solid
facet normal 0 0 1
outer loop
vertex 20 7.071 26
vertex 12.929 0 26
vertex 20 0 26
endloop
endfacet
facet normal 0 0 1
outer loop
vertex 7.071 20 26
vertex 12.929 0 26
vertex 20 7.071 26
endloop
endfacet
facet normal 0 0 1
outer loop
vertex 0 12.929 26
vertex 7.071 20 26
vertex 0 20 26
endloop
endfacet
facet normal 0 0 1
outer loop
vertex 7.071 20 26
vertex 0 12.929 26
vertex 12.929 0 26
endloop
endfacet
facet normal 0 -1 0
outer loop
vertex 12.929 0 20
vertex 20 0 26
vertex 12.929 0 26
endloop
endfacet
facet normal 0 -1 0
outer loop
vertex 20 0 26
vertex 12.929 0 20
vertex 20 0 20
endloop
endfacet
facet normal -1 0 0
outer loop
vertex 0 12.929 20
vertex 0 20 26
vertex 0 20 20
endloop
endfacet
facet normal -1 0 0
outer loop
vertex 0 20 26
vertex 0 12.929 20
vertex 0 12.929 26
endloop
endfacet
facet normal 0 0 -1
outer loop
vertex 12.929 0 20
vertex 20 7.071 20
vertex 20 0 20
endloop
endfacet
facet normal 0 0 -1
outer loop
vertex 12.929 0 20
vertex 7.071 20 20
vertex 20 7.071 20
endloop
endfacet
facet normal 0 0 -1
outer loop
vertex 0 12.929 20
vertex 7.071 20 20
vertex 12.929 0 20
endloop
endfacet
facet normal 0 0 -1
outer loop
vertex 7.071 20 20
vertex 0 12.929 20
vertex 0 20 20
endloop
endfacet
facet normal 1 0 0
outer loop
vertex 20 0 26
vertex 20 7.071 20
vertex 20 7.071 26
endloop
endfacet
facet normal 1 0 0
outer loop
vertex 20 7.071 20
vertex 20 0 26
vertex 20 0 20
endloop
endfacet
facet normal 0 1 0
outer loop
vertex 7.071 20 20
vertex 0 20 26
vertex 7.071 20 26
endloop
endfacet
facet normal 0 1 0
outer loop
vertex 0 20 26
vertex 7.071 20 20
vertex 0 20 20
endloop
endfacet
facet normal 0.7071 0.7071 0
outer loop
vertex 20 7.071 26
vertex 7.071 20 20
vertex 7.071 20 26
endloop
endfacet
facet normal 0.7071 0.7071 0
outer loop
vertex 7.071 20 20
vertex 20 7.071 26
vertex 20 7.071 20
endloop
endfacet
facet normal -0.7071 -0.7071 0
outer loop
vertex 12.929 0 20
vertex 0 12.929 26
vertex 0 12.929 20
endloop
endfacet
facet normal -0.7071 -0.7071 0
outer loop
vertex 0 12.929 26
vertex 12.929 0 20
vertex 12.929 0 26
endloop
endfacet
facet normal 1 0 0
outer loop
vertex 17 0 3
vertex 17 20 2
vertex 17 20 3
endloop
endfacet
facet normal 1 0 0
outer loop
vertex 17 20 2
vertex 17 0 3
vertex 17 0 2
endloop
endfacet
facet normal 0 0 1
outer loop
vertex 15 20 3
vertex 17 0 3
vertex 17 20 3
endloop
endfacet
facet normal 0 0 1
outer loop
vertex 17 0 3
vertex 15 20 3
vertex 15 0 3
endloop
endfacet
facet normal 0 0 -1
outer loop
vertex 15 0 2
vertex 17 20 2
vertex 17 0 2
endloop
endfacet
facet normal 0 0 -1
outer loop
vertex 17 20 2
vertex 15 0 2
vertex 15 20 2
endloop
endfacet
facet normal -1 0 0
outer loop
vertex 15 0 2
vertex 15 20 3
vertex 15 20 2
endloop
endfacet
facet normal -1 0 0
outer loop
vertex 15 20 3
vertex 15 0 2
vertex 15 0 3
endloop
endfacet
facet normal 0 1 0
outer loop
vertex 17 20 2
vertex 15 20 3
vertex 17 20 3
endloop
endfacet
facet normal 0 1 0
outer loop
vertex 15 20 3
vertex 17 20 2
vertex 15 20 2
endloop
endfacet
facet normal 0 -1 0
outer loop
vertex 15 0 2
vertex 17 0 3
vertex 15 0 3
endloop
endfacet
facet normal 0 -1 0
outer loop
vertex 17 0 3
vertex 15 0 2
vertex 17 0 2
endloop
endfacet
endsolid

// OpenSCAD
module part2() {
    translate([5,0,6]) cube([10,20,6]);
    translate([5,0,2]) cube([2,20,1]);
}

module part3() {
    translate([0,5,13]) cube([20,10,6]);
    translate([10,0,2]) cube([2,20,1]);
}

module part4() {
    translate([10,10,23]) rotate([0,0,45]) 
    intersection () {
        rotate([0,0,45]) cube([20,20,6], center=true);
        cube([10,30,6], center=true);
    }
    translate([15,0,2]) cube([2,20,1]);
}

module part1() {
    difference() {
        cube([20,20,26]);
        part2();
        part3();
        part4();
    }
}

//part1();
//part2();
//part3();
part4();
